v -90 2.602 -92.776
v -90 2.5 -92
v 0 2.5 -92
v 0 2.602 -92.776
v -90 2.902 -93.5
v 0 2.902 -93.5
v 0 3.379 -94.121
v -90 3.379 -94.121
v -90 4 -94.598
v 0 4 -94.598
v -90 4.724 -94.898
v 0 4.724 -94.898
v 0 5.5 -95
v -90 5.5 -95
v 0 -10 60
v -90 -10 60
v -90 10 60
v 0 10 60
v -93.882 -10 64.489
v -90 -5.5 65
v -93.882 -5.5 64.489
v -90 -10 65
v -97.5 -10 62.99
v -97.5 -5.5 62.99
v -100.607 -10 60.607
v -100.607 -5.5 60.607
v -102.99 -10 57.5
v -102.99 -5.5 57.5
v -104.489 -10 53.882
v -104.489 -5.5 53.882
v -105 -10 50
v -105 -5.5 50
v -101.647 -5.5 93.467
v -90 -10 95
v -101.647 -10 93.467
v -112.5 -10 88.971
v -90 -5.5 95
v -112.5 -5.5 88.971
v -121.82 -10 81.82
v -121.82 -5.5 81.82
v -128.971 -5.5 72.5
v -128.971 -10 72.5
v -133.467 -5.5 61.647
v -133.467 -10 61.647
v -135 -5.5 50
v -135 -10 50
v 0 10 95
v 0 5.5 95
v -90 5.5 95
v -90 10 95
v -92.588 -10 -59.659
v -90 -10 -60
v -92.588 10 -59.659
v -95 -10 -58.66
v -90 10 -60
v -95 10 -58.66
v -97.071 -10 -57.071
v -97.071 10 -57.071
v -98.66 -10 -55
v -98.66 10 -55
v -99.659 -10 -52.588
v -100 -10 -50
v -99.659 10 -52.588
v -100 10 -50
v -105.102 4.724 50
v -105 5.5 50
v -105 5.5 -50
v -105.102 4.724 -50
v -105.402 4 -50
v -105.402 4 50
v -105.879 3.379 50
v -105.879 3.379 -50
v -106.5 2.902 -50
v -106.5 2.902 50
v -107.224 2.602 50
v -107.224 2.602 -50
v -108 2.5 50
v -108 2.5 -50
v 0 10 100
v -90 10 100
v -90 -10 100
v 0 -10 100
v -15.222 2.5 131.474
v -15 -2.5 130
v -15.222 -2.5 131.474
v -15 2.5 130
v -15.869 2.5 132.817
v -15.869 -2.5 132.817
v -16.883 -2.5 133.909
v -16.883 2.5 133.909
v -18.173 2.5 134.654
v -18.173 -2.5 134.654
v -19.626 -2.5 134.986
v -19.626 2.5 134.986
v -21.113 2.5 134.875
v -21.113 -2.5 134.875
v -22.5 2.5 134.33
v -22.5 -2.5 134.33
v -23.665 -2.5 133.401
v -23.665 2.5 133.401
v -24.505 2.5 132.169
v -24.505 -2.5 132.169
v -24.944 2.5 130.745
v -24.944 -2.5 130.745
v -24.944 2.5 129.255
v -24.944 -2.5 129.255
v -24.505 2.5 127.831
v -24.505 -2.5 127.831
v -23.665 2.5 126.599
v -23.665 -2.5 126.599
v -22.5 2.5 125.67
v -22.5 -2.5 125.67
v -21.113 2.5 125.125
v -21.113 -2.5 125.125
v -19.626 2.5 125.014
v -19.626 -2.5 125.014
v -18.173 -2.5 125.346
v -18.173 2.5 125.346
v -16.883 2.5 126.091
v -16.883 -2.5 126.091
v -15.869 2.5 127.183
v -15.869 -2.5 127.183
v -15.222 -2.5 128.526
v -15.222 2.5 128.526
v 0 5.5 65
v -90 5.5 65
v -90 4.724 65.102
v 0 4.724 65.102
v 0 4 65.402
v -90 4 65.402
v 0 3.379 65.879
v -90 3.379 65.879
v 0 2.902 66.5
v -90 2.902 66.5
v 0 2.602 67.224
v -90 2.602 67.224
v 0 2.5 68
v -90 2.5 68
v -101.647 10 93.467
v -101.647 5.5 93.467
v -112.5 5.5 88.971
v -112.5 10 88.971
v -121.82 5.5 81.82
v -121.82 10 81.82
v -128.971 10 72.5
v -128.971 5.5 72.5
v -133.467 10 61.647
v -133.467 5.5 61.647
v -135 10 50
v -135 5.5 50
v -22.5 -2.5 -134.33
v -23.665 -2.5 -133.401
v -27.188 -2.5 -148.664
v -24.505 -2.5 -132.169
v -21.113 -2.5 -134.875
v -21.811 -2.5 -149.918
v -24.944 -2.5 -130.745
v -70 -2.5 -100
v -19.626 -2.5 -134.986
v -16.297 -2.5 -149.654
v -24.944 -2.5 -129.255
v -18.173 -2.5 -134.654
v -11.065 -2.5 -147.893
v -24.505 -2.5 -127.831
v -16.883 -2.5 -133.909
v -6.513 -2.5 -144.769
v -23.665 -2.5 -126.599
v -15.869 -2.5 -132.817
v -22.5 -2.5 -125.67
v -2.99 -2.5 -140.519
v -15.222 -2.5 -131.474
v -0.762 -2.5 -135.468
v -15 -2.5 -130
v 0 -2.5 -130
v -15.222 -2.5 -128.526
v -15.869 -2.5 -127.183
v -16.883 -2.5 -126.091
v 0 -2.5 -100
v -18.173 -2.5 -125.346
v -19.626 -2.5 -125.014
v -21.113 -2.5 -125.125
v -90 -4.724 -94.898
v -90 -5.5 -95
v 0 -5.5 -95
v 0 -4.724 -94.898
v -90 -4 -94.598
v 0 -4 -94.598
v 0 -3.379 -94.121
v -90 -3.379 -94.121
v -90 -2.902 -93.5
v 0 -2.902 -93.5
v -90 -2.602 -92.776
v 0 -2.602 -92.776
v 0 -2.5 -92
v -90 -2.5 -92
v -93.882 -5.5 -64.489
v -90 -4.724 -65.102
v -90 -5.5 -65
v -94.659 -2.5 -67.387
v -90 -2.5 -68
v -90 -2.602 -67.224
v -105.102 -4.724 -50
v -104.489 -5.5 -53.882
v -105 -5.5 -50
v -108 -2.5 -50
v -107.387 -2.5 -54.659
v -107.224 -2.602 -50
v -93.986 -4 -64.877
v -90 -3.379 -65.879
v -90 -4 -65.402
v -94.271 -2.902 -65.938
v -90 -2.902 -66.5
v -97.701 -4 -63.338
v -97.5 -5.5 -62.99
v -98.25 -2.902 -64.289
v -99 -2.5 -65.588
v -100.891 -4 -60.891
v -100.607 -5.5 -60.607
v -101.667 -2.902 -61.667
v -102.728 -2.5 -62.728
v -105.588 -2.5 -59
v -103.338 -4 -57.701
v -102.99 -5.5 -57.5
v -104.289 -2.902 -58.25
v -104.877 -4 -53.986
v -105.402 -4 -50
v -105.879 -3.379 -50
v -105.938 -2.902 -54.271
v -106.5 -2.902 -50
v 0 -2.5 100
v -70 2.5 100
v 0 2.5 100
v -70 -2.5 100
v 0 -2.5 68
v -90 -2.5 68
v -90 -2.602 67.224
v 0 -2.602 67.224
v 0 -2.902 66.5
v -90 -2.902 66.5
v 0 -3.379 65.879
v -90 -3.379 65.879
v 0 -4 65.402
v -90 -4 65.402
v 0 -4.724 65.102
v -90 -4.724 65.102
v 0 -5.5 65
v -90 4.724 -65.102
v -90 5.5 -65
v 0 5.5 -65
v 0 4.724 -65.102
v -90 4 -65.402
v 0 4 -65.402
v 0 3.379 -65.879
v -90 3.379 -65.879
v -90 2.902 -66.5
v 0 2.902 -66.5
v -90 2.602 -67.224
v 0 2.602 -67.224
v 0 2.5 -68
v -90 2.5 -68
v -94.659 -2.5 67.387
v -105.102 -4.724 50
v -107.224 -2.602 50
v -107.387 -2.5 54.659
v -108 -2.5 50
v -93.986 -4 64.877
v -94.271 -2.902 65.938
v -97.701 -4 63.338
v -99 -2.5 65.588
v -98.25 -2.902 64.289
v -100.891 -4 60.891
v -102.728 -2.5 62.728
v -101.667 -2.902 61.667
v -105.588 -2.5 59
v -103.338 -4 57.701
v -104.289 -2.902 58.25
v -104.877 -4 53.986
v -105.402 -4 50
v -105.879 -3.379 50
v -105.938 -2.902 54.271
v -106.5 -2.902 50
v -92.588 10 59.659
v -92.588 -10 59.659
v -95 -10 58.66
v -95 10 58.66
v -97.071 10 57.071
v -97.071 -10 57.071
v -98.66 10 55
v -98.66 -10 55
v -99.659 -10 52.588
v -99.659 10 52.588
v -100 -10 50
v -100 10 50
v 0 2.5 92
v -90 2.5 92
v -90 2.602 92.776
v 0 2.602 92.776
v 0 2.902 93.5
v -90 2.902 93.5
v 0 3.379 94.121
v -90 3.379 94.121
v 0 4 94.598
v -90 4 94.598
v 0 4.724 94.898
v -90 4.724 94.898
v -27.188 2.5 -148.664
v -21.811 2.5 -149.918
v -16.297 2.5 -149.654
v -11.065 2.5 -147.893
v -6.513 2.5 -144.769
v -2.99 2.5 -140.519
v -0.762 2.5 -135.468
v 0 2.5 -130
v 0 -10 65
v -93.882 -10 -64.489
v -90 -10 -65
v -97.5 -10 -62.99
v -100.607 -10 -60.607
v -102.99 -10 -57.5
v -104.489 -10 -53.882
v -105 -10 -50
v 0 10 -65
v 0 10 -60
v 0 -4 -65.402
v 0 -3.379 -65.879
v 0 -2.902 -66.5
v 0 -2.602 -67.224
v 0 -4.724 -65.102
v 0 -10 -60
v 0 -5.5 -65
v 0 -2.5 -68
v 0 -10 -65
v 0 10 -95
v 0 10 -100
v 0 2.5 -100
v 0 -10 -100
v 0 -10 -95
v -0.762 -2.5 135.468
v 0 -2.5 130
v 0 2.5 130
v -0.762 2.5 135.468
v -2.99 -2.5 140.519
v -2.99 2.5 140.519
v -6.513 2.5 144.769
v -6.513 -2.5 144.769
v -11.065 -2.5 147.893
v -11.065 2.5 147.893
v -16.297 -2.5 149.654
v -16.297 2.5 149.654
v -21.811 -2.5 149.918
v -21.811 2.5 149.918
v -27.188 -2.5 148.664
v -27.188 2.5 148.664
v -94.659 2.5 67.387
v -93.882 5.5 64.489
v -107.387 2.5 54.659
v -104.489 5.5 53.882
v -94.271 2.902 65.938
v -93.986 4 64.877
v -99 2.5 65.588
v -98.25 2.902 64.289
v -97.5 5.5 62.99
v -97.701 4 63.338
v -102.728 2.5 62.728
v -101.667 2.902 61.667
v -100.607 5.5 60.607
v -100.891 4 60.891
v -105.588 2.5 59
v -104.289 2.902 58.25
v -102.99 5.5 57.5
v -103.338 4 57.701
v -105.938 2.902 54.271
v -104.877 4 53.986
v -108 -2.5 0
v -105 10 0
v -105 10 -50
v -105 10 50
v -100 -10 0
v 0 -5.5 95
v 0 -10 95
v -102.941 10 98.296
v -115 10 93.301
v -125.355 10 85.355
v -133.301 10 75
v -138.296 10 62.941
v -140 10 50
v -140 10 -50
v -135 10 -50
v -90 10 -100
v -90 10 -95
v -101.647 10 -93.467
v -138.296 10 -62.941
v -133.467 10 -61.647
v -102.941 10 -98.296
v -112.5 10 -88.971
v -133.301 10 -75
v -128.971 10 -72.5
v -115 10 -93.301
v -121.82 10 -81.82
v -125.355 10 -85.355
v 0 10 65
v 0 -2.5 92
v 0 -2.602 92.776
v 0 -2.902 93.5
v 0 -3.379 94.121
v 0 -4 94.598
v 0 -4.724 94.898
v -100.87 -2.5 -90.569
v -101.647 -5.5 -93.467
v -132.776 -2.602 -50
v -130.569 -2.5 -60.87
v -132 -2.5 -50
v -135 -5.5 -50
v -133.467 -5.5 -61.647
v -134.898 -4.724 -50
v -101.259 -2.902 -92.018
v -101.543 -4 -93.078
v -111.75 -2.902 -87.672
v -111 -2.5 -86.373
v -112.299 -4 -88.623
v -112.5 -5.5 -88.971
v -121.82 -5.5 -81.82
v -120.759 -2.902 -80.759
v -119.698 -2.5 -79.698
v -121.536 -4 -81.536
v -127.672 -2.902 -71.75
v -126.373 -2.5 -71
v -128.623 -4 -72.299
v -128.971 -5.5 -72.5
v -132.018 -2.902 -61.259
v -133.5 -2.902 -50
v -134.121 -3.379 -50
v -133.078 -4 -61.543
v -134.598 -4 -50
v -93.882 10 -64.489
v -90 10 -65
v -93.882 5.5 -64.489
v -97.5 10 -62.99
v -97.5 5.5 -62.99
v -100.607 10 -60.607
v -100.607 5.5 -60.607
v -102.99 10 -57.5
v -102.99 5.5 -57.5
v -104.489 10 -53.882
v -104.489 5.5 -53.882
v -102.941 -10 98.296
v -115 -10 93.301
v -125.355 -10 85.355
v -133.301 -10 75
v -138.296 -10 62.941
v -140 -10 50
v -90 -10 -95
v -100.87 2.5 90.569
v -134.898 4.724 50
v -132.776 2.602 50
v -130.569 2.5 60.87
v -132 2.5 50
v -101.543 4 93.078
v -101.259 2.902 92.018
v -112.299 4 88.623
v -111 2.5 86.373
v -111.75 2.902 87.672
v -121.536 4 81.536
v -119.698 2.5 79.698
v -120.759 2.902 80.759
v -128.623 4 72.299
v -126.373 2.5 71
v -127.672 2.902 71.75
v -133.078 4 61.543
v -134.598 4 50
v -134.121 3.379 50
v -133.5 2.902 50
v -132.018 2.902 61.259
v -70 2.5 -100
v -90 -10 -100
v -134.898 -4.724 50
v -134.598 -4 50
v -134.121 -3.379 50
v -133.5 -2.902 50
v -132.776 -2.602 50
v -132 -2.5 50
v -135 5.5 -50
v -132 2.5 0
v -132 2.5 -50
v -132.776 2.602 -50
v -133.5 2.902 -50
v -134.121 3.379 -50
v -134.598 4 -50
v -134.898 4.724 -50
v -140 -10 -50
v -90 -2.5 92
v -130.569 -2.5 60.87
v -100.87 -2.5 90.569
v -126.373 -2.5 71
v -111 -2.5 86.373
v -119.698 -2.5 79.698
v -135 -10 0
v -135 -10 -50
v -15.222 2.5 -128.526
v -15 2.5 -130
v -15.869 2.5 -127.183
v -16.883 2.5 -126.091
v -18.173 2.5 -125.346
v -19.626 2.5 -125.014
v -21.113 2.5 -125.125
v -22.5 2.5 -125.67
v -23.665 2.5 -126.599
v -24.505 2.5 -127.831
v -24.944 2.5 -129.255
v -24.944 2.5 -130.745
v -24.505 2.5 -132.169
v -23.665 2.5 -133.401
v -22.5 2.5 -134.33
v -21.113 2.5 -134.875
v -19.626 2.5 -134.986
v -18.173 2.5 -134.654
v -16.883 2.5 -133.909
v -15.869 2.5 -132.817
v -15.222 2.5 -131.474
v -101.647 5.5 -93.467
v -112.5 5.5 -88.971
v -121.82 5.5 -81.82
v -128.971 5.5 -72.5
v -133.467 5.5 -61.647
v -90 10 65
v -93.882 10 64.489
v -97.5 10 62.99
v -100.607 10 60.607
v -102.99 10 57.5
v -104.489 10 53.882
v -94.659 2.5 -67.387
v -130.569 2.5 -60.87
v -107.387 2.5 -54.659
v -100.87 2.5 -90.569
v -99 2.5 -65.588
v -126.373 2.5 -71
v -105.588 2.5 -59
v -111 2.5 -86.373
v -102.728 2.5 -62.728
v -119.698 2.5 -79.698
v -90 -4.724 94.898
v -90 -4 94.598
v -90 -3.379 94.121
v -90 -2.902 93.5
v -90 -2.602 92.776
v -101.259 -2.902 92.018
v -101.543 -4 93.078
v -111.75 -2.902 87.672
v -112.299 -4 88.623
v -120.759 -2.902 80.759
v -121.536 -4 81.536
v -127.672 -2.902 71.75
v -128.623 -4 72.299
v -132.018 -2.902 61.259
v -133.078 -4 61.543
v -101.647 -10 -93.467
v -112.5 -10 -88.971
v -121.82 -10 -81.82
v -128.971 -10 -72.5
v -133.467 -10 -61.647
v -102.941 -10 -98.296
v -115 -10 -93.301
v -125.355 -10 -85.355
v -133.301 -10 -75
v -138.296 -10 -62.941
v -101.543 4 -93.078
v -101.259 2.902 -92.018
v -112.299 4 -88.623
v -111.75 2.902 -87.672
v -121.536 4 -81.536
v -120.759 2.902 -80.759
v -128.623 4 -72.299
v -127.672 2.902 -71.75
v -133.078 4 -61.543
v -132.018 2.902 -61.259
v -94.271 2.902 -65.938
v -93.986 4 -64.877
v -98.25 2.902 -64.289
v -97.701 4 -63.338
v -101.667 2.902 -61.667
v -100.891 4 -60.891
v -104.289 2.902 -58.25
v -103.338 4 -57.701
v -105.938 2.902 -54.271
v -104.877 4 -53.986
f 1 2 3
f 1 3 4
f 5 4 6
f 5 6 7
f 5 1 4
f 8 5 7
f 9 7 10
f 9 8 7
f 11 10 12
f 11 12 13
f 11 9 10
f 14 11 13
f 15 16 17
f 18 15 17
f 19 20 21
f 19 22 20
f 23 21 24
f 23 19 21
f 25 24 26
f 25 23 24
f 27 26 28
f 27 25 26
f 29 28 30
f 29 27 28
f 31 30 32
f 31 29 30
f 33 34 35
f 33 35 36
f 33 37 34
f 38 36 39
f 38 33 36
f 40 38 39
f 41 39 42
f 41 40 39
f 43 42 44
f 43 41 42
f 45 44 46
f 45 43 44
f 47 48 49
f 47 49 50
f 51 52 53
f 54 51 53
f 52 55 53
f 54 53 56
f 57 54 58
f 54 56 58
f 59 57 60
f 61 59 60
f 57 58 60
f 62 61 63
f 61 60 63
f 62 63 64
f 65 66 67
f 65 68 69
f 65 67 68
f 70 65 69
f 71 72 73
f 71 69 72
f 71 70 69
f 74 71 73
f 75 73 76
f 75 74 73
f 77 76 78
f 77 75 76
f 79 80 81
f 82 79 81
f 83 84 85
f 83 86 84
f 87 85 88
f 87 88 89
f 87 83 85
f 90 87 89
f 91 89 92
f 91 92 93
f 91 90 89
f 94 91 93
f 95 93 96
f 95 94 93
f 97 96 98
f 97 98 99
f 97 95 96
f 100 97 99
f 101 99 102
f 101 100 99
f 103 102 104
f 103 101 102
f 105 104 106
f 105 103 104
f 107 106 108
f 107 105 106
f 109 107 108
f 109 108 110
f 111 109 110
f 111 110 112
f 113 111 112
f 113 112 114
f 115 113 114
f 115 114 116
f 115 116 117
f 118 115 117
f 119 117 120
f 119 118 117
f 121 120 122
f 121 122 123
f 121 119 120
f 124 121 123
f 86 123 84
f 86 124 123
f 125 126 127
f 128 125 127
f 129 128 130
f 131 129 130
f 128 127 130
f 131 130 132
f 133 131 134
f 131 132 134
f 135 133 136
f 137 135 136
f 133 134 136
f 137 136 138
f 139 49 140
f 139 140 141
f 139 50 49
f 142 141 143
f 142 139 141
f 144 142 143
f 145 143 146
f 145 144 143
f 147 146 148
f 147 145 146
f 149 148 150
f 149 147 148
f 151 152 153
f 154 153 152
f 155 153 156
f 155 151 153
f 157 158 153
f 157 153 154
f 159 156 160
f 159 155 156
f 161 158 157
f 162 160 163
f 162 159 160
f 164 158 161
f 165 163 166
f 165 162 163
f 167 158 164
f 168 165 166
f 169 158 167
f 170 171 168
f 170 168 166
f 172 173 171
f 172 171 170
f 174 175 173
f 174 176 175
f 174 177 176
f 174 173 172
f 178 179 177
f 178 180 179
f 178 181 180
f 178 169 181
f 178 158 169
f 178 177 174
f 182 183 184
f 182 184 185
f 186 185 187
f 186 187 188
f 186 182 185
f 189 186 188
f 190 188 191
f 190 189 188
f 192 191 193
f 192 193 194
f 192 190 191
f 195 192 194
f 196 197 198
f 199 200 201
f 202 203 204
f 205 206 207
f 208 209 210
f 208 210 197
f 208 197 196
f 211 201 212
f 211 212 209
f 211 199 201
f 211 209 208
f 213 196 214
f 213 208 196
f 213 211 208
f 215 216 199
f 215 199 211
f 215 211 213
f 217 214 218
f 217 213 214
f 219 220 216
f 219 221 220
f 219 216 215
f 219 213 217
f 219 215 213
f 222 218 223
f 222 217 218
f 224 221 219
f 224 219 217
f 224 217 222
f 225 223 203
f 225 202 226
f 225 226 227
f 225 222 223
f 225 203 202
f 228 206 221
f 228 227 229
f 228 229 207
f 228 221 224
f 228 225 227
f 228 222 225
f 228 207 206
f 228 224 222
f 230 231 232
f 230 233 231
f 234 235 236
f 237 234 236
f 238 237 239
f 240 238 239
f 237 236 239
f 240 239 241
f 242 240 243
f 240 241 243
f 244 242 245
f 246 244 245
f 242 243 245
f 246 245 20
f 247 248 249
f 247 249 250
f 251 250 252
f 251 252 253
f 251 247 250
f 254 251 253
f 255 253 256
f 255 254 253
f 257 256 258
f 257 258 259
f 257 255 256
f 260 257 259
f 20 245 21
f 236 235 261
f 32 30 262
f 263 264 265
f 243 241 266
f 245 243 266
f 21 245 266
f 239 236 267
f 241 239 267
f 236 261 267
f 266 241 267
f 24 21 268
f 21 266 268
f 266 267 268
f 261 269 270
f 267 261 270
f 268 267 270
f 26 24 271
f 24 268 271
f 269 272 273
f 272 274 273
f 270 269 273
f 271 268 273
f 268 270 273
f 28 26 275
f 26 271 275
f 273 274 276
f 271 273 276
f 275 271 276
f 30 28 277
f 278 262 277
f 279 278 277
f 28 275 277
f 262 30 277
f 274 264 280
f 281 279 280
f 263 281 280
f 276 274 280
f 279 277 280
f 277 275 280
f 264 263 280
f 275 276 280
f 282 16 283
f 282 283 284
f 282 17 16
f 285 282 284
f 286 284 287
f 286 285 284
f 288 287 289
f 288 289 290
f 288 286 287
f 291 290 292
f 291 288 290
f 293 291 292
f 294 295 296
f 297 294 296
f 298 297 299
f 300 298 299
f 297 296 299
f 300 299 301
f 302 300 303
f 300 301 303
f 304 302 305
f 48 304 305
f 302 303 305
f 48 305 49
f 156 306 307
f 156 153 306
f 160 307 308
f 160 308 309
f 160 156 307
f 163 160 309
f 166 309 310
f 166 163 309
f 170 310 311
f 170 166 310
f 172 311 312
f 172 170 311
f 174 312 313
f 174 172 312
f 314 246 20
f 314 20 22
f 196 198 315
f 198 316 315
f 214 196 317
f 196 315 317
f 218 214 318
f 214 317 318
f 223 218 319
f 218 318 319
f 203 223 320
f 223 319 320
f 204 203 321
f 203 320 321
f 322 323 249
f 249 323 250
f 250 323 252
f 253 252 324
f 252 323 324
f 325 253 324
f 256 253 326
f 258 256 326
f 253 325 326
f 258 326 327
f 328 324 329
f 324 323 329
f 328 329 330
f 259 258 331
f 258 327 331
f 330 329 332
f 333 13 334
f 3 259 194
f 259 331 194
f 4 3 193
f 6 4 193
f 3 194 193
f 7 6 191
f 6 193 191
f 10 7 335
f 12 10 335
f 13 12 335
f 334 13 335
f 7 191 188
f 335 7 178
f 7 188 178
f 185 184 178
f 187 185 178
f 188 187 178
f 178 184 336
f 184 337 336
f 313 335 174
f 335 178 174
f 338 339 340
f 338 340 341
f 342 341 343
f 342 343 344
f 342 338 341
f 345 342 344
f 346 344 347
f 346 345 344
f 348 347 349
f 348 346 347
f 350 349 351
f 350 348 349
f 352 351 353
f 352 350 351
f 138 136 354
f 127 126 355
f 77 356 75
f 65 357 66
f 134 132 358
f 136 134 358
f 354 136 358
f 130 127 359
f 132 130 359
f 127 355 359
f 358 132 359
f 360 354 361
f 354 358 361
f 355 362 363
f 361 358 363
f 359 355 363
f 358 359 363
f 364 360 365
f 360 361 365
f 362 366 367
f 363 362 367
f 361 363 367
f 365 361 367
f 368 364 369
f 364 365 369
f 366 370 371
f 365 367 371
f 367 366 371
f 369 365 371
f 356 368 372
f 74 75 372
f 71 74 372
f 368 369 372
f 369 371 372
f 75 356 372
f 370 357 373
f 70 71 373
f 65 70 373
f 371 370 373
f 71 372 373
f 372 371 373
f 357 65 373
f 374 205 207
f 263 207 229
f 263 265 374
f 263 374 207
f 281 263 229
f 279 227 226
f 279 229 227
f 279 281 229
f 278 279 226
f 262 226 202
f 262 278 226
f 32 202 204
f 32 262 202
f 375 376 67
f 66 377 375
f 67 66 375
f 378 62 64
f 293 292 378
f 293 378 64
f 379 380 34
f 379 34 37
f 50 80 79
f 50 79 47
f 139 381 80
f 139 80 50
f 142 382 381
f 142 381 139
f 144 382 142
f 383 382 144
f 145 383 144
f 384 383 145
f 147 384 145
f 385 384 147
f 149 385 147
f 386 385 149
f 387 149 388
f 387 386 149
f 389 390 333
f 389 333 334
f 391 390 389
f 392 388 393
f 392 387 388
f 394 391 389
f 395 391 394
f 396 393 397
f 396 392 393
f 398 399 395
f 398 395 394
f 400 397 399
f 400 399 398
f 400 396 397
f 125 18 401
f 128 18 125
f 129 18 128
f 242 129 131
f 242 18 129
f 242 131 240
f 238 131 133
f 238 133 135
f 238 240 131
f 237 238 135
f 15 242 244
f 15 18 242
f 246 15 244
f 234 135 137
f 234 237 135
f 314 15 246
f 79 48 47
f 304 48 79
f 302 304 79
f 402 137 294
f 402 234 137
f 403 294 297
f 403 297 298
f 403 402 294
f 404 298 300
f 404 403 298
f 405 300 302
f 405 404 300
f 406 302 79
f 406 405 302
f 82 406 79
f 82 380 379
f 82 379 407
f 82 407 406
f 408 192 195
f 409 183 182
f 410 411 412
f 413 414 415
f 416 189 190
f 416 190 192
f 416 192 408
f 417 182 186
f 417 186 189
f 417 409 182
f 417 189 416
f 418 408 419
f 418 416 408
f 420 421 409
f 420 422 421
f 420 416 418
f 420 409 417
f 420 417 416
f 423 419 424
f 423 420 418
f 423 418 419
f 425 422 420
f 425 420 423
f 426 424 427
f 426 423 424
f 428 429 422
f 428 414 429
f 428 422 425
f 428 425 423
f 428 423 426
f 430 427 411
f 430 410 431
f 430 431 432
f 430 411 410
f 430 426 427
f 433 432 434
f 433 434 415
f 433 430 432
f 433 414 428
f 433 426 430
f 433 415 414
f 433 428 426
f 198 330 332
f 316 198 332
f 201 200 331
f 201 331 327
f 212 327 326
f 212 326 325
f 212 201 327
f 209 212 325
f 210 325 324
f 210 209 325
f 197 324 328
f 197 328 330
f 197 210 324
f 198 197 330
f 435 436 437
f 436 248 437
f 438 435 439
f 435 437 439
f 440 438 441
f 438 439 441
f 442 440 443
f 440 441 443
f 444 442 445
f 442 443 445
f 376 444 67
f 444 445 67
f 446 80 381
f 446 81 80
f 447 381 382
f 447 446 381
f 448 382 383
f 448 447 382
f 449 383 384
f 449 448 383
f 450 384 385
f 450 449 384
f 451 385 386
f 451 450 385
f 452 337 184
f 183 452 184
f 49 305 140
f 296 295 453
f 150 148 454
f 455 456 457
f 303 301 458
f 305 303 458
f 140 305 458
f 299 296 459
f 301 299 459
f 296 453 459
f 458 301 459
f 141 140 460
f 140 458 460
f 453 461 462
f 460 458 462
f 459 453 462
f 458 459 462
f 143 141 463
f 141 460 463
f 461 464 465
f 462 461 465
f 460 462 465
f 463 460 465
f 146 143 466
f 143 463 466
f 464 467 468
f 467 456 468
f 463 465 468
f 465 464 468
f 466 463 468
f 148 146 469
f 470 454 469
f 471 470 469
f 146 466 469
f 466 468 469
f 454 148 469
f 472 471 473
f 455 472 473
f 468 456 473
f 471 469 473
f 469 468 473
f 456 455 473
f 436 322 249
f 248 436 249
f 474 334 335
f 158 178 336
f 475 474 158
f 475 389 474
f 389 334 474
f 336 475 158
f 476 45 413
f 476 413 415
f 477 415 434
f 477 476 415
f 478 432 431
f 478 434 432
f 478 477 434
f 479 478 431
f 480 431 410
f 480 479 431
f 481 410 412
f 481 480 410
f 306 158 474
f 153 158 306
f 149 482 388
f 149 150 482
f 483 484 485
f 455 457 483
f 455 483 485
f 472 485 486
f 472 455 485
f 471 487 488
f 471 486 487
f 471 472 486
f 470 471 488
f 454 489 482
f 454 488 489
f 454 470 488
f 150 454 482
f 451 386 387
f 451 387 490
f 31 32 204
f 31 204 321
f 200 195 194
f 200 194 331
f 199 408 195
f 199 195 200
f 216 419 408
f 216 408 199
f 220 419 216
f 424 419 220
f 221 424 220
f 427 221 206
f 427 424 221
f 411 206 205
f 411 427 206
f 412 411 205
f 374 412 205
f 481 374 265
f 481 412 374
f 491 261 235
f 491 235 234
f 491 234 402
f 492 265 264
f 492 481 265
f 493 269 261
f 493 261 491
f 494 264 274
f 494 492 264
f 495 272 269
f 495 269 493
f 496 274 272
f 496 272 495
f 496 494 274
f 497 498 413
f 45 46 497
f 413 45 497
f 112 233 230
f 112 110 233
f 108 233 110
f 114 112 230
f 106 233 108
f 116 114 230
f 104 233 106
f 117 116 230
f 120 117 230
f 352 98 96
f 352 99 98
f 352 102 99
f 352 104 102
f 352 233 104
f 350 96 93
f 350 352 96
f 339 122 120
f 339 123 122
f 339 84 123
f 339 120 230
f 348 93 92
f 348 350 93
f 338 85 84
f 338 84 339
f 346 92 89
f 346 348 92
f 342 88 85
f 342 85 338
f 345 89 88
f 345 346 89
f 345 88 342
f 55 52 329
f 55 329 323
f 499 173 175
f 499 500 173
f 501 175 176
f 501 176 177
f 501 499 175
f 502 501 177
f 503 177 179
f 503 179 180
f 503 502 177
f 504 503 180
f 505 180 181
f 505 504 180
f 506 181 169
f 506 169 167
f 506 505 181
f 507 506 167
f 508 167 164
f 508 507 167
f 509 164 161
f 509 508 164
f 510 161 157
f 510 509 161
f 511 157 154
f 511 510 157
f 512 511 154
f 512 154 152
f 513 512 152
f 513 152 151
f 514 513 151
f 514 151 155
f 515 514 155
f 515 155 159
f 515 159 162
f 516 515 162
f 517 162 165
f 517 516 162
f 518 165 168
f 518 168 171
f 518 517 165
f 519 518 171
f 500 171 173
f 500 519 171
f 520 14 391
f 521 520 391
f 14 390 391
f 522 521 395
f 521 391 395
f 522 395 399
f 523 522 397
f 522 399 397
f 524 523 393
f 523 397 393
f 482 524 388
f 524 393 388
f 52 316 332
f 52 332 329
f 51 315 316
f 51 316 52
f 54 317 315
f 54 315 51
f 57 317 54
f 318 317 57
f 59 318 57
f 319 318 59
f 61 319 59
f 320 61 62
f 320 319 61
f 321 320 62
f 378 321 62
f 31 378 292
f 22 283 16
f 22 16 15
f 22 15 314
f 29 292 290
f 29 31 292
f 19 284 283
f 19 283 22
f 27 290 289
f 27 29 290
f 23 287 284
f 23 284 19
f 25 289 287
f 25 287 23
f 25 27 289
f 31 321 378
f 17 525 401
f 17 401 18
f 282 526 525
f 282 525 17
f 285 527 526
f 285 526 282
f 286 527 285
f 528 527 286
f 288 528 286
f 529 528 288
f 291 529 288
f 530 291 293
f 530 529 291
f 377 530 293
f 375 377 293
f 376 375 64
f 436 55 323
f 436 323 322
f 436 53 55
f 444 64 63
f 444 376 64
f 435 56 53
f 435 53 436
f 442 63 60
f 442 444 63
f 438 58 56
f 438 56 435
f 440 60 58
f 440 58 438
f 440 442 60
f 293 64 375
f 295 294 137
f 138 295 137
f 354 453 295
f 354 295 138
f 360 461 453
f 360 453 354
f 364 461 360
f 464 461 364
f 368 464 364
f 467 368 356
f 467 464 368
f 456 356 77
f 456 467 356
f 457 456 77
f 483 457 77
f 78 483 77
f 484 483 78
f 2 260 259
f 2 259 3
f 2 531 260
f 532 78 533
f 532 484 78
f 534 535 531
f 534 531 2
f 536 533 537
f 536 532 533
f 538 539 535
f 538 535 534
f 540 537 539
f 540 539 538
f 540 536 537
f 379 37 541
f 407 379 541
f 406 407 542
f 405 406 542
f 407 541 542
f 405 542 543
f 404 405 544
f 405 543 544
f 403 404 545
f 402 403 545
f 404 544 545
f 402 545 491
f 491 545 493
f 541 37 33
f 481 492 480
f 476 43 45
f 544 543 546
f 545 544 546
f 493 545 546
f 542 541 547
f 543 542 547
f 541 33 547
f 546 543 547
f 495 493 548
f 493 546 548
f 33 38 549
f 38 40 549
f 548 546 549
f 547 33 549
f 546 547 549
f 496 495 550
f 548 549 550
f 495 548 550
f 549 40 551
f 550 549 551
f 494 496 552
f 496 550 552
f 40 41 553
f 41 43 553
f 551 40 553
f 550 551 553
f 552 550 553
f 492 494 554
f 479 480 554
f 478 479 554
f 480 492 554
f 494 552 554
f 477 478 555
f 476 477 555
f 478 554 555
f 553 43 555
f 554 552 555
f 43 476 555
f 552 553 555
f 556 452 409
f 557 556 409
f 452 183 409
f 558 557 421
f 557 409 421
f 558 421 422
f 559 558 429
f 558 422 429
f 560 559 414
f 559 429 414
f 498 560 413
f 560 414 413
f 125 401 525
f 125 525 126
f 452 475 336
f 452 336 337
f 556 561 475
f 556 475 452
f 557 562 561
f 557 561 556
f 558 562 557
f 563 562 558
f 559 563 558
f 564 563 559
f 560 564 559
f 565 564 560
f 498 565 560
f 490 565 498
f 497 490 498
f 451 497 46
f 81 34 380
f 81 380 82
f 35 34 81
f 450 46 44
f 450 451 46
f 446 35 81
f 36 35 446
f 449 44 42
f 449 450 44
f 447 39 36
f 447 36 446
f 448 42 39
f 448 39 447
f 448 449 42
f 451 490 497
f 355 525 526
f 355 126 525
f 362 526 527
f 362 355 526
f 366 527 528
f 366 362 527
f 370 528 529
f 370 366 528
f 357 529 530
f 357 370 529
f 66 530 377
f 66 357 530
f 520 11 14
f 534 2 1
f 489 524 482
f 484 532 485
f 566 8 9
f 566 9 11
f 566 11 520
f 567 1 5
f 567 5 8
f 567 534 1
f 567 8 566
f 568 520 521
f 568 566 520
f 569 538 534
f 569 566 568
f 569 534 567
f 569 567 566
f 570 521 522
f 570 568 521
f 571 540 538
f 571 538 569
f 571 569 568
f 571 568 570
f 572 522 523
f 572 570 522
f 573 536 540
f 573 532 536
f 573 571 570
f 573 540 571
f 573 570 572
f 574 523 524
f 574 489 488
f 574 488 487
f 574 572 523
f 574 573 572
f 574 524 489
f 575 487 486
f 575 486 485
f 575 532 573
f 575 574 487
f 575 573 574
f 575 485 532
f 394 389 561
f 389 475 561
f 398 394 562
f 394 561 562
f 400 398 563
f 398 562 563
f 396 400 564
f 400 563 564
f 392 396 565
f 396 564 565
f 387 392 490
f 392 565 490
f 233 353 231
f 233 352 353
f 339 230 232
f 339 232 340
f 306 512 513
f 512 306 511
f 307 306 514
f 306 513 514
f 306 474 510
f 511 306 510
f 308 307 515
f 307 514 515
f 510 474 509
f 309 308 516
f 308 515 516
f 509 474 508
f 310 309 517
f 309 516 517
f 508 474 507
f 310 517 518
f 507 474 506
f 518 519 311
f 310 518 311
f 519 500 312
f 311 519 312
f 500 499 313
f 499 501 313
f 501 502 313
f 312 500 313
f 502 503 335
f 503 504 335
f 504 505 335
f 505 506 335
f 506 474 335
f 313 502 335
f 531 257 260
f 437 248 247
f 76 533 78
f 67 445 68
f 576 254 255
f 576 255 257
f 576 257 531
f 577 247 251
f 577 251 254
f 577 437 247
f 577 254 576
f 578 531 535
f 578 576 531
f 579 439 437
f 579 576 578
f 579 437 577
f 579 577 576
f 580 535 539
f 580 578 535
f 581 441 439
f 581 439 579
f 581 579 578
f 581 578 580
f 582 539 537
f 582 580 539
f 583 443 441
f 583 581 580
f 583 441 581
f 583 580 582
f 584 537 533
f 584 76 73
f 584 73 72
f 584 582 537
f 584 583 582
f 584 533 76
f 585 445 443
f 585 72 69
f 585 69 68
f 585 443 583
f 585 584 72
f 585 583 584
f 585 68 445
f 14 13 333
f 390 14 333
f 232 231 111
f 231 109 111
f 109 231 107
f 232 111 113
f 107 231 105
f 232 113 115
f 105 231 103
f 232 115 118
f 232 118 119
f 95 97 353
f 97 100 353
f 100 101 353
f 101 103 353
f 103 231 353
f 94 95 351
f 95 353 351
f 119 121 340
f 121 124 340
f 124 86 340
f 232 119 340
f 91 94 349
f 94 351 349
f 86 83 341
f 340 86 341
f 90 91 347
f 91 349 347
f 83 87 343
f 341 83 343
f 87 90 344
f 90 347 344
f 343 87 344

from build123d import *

# Parameters (mm, degrees)
F4_R     = 5
F5_DEPTH = 2.5
F6_DEPTH = 2.5


with BuildPart() as f2:
    # F2: sweep along a path in F0
    with BuildLine(Plane.XZ) as f2_path:
        Line((0, 60), (-90, 60))
        ThreePointArc((-90, 60), (-97.0710678119, 57.0710678119), (-100, 50))
        Line((-100, 50), (-100, 0))
    # F1 (on Right) → F2 (sweep)
    with BuildSketch(Plane.YZ):
        with BuildLine():
            Line((10, 100), (0, 100))
            Line((0, 100), (-10, 100))
            Line((-10, 100), (-10, 95))
            Line((-10, 95), (-5.5, 95))
            ThreePointArc((-5.5, 95), (-3.3786796564, 94.1213203436), (-2.5, 92))
            Line((-2.5, 92), (-2.5, 68))
            ThreePointArc((-2.5, 68), (-3.3786796564, 65.8786796564), (-5.5, 65))
            Line((-5.5, 65), (-10, 65))
            Line((-10, 65), (-10, 60))
            Line((-10, 60), (0, 60))
            Line((0, 60), (10, 60))
            Line((10, 60), (10, 65))
            Line((10, 65), (5.5, 65))
            ThreePointArc((5.5, 65), (3.3786796564, 65.8786796564), (2.5, 68))
            Line((2.5, 68), (2.5, 92))
            ThreePointArc((2.5, 92), (3.3786796564, 94.1213203436), (5.5, 95))
            Line((5.5, 95), (10, 95))
            Line((10, 95), (10, 100))
        make_face()
    sweep(path=f2_path.line)

    # F3: F2 across plane


with BuildPart() as f2_1:
    add(f2.part)
    add(f2.part.mirror(Plane.XY))

    # F4 (on Front) → F6 (join, symmetric)
    with BuildSketch(Plane.XZ):
        with BuildLine():
            Line((0, -130), (0, -100))
            Line((0, -100), (-70, -100))
            Line((-70, -100), (-27.1876231576, -148.6638172233))
            ThreePointArc((-27.1876231576, -148.6638172233), (-8.6808229794, -146.488669794), (0, -130))
        make_face()
        with Locations((-20, -130)):
            Circle(F4_R, mode=Mode.SUBTRACT)
    extrude(amount=F6_DEPTH, both=True)


with BuildPart() as f5:
    # F4 (on Front) → F5 (new body, symmetric)
    with BuildSketch(Plane.XZ):
        with BuildLine():
            Line((-70, 100), (0, 100))
            Line((0, 100), (0, 130))
            ThreePointArc((0, 130), (-8.6808229794, 146.488669794), (-27.1876231576, 148.6638172233))
            Line((-27.1876231576, 148.6638172233), (-70, 100))
        make_face()
        with Locations((-20, 130)):
            Circle(F4_R, mode=Mode.SUBTRACT)
    extrude(amount=F5_DEPTH, both=True)


solid = Compound([f2_1.part, f5.part])
